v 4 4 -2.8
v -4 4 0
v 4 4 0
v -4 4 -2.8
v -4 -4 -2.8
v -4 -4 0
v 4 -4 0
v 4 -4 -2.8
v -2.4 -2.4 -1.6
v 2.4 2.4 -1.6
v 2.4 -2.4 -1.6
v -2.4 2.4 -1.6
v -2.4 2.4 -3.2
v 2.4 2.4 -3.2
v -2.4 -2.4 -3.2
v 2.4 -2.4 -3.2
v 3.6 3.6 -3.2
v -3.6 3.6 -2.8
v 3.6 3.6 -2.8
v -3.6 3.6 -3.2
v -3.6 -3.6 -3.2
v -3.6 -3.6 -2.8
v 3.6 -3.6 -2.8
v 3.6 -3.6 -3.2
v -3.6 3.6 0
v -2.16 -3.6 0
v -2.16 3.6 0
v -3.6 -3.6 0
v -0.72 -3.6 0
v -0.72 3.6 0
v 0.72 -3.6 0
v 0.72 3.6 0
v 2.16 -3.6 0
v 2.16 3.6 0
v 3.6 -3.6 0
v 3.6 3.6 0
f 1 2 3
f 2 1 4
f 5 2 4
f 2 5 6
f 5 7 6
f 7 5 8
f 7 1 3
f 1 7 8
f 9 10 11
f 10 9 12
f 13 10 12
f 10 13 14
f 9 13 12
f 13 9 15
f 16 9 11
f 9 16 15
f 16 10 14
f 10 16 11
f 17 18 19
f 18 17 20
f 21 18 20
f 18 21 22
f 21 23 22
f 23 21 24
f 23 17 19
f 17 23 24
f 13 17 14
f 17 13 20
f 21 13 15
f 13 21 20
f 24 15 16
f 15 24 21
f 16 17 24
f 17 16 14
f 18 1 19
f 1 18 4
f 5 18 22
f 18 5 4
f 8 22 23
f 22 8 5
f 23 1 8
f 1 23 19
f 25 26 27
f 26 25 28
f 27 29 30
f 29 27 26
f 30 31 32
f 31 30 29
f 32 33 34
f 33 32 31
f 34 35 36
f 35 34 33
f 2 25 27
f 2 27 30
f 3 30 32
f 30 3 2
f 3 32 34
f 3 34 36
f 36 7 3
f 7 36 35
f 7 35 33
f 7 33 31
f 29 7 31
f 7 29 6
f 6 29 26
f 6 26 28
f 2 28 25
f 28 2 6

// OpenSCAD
// file: ../p/box5.scad
use <../lib.scad>
function ldraw_lib__box5() = [
// 0 Box with 5 Faces and All Edges
// 0 Name: box5.dat
// 0 Author: James Jessiman
// 0 !LDRAW_ORG Primitive UPDATE 2012-01
// 0 !LICENSE Licensed under CC BY 4.0 : see CAreadme.txt
// 
// 0 BFC CERTIFY CCW
  [0,"BFC","CERTIFY"],
  [0,"BFC","CCW"],
// 
// 0 !HISTORY 2002-04-03 [sbliss] Modified for BFC compliance
// 0 !HISTORY 2002-04-25 [PTadmin] Official Update 2002-02
// 0 !HISTORY 2007-06-24 [PTadmin] Header formatted for Contributor Agreement
// 0 !HISTORY 2008-07-01 [PTadmin] Official Update 2008-01
// 0 !HISTORY 2012-02-16 [Philo] Changed to CCW
// 0 !HISTORY 2012-03-30 [PTadmin] Official Update 2012-01
// 
// 
// 2 24 1 1 1 -1 1 1
  [2,24,1,1,1,-1,1,1],
// 2 24 -1 1 1 -1 1 -1
  [2,24,-1,1,1,-1,1,-1],
// 2 24 -1 1 -1 1 1 -1
  [2,24,-1,1,-1,1,1,-1],
// 2 24 1 1 -1 1 1 1
  [2,24,1,1,-1,1,1,1],
// 2 24 1 0 1 -1 0 1
  [2,24,1,0,1,-1,0,1],
// 2 24 -1 0 1 -1 0 -1
  [2,24,-1,0,1,-1,0,-1],
// 2 24 -1 0 -1 1 0 -1
  [2,24,-1,0,-1,1,0,-1],
// 2 24 1 0 -1 1 0 1
  [2,24,1,0,-1,1,0,1],
// 2 24 1 0 1 1 1 1
  [2,24,1,0,1,1,1,1],
// 2 24 -1 0 1 -1 1 1
  [2,24,-1,0,1,-1,1,1],
// 2 24 1 0 -1 1 1 -1
  [2,24,1,0,-1,1,1,-1],
// 2 24 -1 0 -1 -1 1 -1
  [2,24,-1,0,-1,-1,1,-1],
// 4 16 -1 1 1 1 1 1 1 1 -1 -1 1 -1
  [4,16,-1,1,1,1,1,1,1,1,-1,-1,1,-1],
// 4 16 -1 1 1 -1 0 1 1 0 1 1 1 1
  [4,16,-1,1,1,-1,0,1,1,0,1,1,1,1],
// 4 16 -1 1 -1 -1 0 -1 -1 0 1 -1 1 1
  [4,16,-1,1,-1,-1,0,-1,-1,0,1,-1,1,1],
// 4 16 1 1 -1 1 0 -1 -1 0 -1 -1 1 -1
  [4,16,1,1,-1,1,0,-1,-1,0,-1,-1,1,-1],
// 4 16 1 1 1 1 0 1 1 0 -1 1 1 -1
  [4,16,1,1,1,1,0,1,1,0,-1,1,1,-1],
];
module ldraw_lib__box5(step=0, col=false, unit=2/5, alt=false, line=0.2, solid=!$preview)
    makepoly(ldraw_lib__box5(), step=step, col=col, unit=unit, alt=alt, line=line, solid=solid);
ldraw_lib__box5(line=0.2);
// file: ../p/box4.scad
use <../lib.scad>
function ldraw_lib__box4() = [
// 0 Box with 4 Faces (2 Parallel Pairs) and All Edges
// 0 Name: box4.dat
// 0 Author: James Jessiman
// 0 !LDRAW_ORG Primitive UPDATE 2012-01
// 0 !LICENSE Licensed under CC BY 4.0 : see CAreadme.txt
// 
// 0 BFC CERTIFY CCW
  [0,"BFC","CERTIFY"],
  [0,"BFC","CCW"],
// 
// 0 !HISTORY 2002-04-03 [sbliss] Modified for BFC compliance
// 0 !HISTORY 2002-04-25 [PTadmin] Official Update 2002-02
// 0 !HISTORY 2007-06-24 [PTadmin] Header formatted for Contributor Agreement
// 0 !HISTORY 2008-07-01 [PTadmin] Official Update 2008-01
// 0 !HISTORY 2012-02-16 [Philo] Changed to CCW
// 0 !HISTORY 2012-03-30 [PTadmin] Official Update 2012-01
// 
// 
// 2 24 1 1 1 -1 1 1
  [2,24,1,1,1,-1,1,1],
// 2 24 -1 1 1 -1 1 -1
  [2,24,-1,1,1,-1,1,-1],
// 2 24 -1 1 -1 1 1 -1
  [2,24,-1,1,-1,1,1,-1],
// 2 24 1 1 -1 1 1 1
  [2,24,1,1,-1,1,1,1],
// 2 24 1 0 1 -1 0 1
  [2,24,1,0,1,-1,0,1],
// 2 24 -1 0 1 -1 0 -1
  [2,24,-1,0,1,-1,0,-1],
// 2 24 -1 0 -1 1 0 -1
  [2,24,-1,0,-1,1,0,-1],
// 2 24 1 0 -1 1 0 1
  [2,24,1,0,-1,1,0,1],
// 2 24 1 0 1 1 1 1
  [2,24,1,0,1,1,1,1],
// 2 24 -1 0 1 -1 1 1
  [2,24,-1,0,1,-1,1,1],
// 2 24 1 0 -1 1 1 -1
  [2,24,1,0,-1,1,1,-1],
// 2 24 -1 0 -1 -1 1 -1
  [2,24,-1,0,-1,-1,1,-1],
// 4 16 -1 1 1 -1 0 1 1 0 1 1 1 1
  [4,16,-1,1,1,-1,0,1,1,0,1,1,1,1],
// 4 16 -1 1 -1 -1 0 -1 -1 0 1 -1 1 1
  [4,16,-1,1,-1,-1,0,-1,-1,0,1,-1,1,1],
// 4 16 1 1 -1 1 0 -1 -1 0 -1 -1 1 -1
  [4,16,1,1,-1,1,0,-1,-1,0,-1,-1,1,-1],
// 4 16 1 1 1 1 0 1 1 0 -1 1 1 -1
  [4,16,1,1,1,1,0,1,1,0,-1,1,1,-1],
];
module ldraw_lib__box4(step=0, col=false, unit=2/5, alt=false, line=0.2, solid=!$preview)
    makepoly(ldraw_lib__box4(), step=step, col=col, unit=unit, alt=alt, line=line, solid=solid);
ldraw_lib__box4(line=0.2);
// file: s/3070bs01.scad
use <../../lib.scad>
use <../../p/box4.scad>
use <../../p/box5.scad>
function ldraw_lib__s__3070bs01() = [
// 0 ~Tile  1 x  1 with Groove without Top Face
// 0 Name: s\3070bs01.dat
// 0 Author: Chris Dee [cwdee]
// 0 !LDRAW_ORG Subpart UPDATE 2009-02
// 0 !LICENSE Licensed under CC BY 4.0 : see CAreadme.txt
// 
// 0 BFC CERTIFY CCW
  [0,"BFC","CERTIFY"],
  [0,"BFC","CCW"],
// 
// 0 !HISTORY 2009-09-03 [PTadmin] Official Update 2009-02
// 
// 
// 1 16 0 0 0 10 0 0 0 7 0 0 0 10 box4.dat
  [1,16,0,0,0,10,0,0,0,7,0,0,0,10, ldraw_lib__box4()],
// 0 BFC INVERTNEXT
  [0,"BFC","INVERTNEXT"],
// 1 16 0 8 0 6 0 0 0 -4 0 0 0 6 box5.dat
  [1,16,0,8,0,6,0,0,0,-4,0,0,0,6, ldraw_lib__box5()],
// 1 16 0 7 0 9 0 0 0 1 0 0 0 9 box4.dat
  [1,16,0,7,0,9,0,0,0,1,0,0,0,9, ldraw_lib__box4()],
// 
// 4 16 9 8 9 6 8 6 -6 8 6 -9 8 9
  [4,16,9,8,9,6,8,6,-6,8,6,-9,8,9],
// 4 16 -9 8 9 -6 8 6 -6 8 -6 -9 8 -9
  [4,16,-9,8,9,-6,8,6,-6,8,-6,-9,8,-9],
// 4 16 -9 8 -9 -6 8 -6 6 8 -6 9 8 -9
  [4,16,-9,8,-9,-6,8,-6,6,8,-6,9,8,-9],
// 4 16 9 8 -9 6 8 -6 6 8 6 9 8 9
  [4,16,9,8,-9,6,8,-6,6,8,6,9,8,9],
// 
// 4 16 10 7 10 9 7 9 -9 7 9 -10 7 10
  [4,16,10,7,10,9,7,9,-9,7,9,-10,7,10],
// 4 16 -10 7 10 -9 7 9 -9 7 -9 -10 7 -10
  [4,16,-10,7,10,-9,7,9,-9,7,-9,-10,7,-10],
// 4 16 -10 7 -10 -9 7 -9 9 7 -9 10 7 -10
  [4,16,-10,7,-10,-9,7,-9,9,7,-9,10,7,-10],
// 4 16 10 7 -10 9 7 -9 9 7 9 10 7 10
  [4,16,10,7,-10,9,7,-9,9,7,9,10,7,10],
// 0
];
module ldraw_lib__s__3070bs01(step=0, col=false, unit=2/5, alt=false, line=0.2, solid=!$preview)
    makepoly(ldraw_lib__s__3070bs01(), step=step, col=col, unit=unit, alt=alt, line=line, solid=solid);
ldraw_lib__s__3070bs01(line=0.2);
// main file
use <../lib.scad>
use <s/3070bs01.scad>
function ldraw_lib__3070bp0l() = [
// 0 Tile  1 x  1 with Rainbow Stripes Pattern
// 0 Name: 3070bp0l.dat
// 0 Author: Vincent Messenet [Cheenzo]
// 0 !LDRAW_ORG Part UPDATE 2020-01
// 0 !LICENSE Licensed under CC BY 4.0 : see CAreadme.txt
// 
// 0 BFC CERTIFY CCW
  [0,"BFC","CERTIFY"],
  [0,"BFC","CCW"],
// 
// 0 !KEYWORDS BrickLink 3070pb133, Rebrickable 3070bpr0192, set 21045
// 
// 0 !HISTORY 2020-06-28 [PTadmin] Official Update 2020-01
// 
// 
// 1 16 0 0 0 1 0 0 0 1 0 0 0 1 s\3070bs01.dat
  [1,16,0,0,0,1,0,0,0,1,0,0,0,1, ldraw_lib__s__3070bs01()],
// 
// 4 353 -9 0 9 -9 0 -9 -5.4 0 -9 -5.4 0 9
  [4,353,-9,0,9,-9,0,-9,-5.4,0,-9,-5.4,0,9],
// 4 14 -5.4 0 9 -5.4 0 -9 -1.8 0 -9 -1.8 0 9
  [4,14,-5.4,0,9,-5.4,0,-9,-1.8,0,-9,-1.8,0,9],
// 4 3 -1.8 0 9 -1.8 0 -9 1.8 0 -9 1.8 0 9
  [4,3,-1.8,0,9,-1.8,0,-9,1.8,0,-9,1.8,0,9],
// 4 321 1.8 0 9 1.8 0 -9 5.4 0 -9 5.4 0 9
  [4,321,1.8,0,9,1.8,0,-9,5.4,0,-9,5.4,0,9],
// 4 30 5.4 0 9 5.4 0 -9 9 0 -9 9 0 9
  [4,30,5.4,0,9,5.4,0,-9,9,0,-9,9,0,9],
// 
// 3 16 -10 0 10 -9 0 9 -5.4 0 9
  [3,16,-10,0,10,-9,0,9,-5.4,0,9],
// 3 16 -10 0 10 -5.4 0 9 -1.8 0 9
  [3,16,-10,0,10,-5.4,0,9,-1.8,0,9],
// 4 16 -1.8 0 9 1.8 0 9 10 0 10 -10 0 10
  [4,16,-1.8,0,9,1.8,0,9,10,0,10,-10,0,10],
// 3 16 10 0 10 1.8 0 9 5.4 0 9
  [3,16,10,0,10,1.8,0,9,5.4,0,9],
// 3 16 10 0 10 5.4 0 9 9 0 9
  [3,16,10,0,10,5.4,0,9,9,0,9],
// 4 16 9 0 -9 10 0 -10 10 0 10 9 0 9
  [4,16,9,0,-9,10,0,-10,10,0,10,9,0,9],
// 3 16 10 0 -10 9 0 -9 5.4 0 -9
  [3,16,10,0,-10,9,0,-9,5.4,0,-9],
// 3 16 10 0 -10 5.4 0 -9 1.8 0 -9
  [3,16,10,0,-10,5.4,0,-9,1.8,0,-9],
// 4 16 10 0 -10 1.8 0 -9 -1.8 0 -9 -10 0 -10
  [4,16,10,0,-10,1.8,0,-9,-1.8,0,-9,-10,0,-10],
// 3 16 -10 0 -10 -1.8 0 -9 -5.4 0 -9
  [3,16,-10,0,-10,-1.8,0,-9,-5.4,0,-9],
// 3 16 -10 0 -10 -5.4 0 -9 -9 0 -9
  [3,16,-10,0,-10,-5.4,0,-9,-9,0,-9],
// 4 16 -9 0 9 -10 0 10 -10 0 -10 -9 0 -9
  [4,16,-9,0,9,-10,0,10,-10,0,-10,-9,0,-9],
];
module ldraw_lib__3070bp0l(step=0, col=false, unit=2/5, alt=false, line=0.2, solid=!$preview)
    makepoly(ldraw_lib__3070bp0l(), step=step, col=col, unit=unit, alt=alt, line=line, solid=solid);
ldraw_lib__3070bp0l(line=0.2);
